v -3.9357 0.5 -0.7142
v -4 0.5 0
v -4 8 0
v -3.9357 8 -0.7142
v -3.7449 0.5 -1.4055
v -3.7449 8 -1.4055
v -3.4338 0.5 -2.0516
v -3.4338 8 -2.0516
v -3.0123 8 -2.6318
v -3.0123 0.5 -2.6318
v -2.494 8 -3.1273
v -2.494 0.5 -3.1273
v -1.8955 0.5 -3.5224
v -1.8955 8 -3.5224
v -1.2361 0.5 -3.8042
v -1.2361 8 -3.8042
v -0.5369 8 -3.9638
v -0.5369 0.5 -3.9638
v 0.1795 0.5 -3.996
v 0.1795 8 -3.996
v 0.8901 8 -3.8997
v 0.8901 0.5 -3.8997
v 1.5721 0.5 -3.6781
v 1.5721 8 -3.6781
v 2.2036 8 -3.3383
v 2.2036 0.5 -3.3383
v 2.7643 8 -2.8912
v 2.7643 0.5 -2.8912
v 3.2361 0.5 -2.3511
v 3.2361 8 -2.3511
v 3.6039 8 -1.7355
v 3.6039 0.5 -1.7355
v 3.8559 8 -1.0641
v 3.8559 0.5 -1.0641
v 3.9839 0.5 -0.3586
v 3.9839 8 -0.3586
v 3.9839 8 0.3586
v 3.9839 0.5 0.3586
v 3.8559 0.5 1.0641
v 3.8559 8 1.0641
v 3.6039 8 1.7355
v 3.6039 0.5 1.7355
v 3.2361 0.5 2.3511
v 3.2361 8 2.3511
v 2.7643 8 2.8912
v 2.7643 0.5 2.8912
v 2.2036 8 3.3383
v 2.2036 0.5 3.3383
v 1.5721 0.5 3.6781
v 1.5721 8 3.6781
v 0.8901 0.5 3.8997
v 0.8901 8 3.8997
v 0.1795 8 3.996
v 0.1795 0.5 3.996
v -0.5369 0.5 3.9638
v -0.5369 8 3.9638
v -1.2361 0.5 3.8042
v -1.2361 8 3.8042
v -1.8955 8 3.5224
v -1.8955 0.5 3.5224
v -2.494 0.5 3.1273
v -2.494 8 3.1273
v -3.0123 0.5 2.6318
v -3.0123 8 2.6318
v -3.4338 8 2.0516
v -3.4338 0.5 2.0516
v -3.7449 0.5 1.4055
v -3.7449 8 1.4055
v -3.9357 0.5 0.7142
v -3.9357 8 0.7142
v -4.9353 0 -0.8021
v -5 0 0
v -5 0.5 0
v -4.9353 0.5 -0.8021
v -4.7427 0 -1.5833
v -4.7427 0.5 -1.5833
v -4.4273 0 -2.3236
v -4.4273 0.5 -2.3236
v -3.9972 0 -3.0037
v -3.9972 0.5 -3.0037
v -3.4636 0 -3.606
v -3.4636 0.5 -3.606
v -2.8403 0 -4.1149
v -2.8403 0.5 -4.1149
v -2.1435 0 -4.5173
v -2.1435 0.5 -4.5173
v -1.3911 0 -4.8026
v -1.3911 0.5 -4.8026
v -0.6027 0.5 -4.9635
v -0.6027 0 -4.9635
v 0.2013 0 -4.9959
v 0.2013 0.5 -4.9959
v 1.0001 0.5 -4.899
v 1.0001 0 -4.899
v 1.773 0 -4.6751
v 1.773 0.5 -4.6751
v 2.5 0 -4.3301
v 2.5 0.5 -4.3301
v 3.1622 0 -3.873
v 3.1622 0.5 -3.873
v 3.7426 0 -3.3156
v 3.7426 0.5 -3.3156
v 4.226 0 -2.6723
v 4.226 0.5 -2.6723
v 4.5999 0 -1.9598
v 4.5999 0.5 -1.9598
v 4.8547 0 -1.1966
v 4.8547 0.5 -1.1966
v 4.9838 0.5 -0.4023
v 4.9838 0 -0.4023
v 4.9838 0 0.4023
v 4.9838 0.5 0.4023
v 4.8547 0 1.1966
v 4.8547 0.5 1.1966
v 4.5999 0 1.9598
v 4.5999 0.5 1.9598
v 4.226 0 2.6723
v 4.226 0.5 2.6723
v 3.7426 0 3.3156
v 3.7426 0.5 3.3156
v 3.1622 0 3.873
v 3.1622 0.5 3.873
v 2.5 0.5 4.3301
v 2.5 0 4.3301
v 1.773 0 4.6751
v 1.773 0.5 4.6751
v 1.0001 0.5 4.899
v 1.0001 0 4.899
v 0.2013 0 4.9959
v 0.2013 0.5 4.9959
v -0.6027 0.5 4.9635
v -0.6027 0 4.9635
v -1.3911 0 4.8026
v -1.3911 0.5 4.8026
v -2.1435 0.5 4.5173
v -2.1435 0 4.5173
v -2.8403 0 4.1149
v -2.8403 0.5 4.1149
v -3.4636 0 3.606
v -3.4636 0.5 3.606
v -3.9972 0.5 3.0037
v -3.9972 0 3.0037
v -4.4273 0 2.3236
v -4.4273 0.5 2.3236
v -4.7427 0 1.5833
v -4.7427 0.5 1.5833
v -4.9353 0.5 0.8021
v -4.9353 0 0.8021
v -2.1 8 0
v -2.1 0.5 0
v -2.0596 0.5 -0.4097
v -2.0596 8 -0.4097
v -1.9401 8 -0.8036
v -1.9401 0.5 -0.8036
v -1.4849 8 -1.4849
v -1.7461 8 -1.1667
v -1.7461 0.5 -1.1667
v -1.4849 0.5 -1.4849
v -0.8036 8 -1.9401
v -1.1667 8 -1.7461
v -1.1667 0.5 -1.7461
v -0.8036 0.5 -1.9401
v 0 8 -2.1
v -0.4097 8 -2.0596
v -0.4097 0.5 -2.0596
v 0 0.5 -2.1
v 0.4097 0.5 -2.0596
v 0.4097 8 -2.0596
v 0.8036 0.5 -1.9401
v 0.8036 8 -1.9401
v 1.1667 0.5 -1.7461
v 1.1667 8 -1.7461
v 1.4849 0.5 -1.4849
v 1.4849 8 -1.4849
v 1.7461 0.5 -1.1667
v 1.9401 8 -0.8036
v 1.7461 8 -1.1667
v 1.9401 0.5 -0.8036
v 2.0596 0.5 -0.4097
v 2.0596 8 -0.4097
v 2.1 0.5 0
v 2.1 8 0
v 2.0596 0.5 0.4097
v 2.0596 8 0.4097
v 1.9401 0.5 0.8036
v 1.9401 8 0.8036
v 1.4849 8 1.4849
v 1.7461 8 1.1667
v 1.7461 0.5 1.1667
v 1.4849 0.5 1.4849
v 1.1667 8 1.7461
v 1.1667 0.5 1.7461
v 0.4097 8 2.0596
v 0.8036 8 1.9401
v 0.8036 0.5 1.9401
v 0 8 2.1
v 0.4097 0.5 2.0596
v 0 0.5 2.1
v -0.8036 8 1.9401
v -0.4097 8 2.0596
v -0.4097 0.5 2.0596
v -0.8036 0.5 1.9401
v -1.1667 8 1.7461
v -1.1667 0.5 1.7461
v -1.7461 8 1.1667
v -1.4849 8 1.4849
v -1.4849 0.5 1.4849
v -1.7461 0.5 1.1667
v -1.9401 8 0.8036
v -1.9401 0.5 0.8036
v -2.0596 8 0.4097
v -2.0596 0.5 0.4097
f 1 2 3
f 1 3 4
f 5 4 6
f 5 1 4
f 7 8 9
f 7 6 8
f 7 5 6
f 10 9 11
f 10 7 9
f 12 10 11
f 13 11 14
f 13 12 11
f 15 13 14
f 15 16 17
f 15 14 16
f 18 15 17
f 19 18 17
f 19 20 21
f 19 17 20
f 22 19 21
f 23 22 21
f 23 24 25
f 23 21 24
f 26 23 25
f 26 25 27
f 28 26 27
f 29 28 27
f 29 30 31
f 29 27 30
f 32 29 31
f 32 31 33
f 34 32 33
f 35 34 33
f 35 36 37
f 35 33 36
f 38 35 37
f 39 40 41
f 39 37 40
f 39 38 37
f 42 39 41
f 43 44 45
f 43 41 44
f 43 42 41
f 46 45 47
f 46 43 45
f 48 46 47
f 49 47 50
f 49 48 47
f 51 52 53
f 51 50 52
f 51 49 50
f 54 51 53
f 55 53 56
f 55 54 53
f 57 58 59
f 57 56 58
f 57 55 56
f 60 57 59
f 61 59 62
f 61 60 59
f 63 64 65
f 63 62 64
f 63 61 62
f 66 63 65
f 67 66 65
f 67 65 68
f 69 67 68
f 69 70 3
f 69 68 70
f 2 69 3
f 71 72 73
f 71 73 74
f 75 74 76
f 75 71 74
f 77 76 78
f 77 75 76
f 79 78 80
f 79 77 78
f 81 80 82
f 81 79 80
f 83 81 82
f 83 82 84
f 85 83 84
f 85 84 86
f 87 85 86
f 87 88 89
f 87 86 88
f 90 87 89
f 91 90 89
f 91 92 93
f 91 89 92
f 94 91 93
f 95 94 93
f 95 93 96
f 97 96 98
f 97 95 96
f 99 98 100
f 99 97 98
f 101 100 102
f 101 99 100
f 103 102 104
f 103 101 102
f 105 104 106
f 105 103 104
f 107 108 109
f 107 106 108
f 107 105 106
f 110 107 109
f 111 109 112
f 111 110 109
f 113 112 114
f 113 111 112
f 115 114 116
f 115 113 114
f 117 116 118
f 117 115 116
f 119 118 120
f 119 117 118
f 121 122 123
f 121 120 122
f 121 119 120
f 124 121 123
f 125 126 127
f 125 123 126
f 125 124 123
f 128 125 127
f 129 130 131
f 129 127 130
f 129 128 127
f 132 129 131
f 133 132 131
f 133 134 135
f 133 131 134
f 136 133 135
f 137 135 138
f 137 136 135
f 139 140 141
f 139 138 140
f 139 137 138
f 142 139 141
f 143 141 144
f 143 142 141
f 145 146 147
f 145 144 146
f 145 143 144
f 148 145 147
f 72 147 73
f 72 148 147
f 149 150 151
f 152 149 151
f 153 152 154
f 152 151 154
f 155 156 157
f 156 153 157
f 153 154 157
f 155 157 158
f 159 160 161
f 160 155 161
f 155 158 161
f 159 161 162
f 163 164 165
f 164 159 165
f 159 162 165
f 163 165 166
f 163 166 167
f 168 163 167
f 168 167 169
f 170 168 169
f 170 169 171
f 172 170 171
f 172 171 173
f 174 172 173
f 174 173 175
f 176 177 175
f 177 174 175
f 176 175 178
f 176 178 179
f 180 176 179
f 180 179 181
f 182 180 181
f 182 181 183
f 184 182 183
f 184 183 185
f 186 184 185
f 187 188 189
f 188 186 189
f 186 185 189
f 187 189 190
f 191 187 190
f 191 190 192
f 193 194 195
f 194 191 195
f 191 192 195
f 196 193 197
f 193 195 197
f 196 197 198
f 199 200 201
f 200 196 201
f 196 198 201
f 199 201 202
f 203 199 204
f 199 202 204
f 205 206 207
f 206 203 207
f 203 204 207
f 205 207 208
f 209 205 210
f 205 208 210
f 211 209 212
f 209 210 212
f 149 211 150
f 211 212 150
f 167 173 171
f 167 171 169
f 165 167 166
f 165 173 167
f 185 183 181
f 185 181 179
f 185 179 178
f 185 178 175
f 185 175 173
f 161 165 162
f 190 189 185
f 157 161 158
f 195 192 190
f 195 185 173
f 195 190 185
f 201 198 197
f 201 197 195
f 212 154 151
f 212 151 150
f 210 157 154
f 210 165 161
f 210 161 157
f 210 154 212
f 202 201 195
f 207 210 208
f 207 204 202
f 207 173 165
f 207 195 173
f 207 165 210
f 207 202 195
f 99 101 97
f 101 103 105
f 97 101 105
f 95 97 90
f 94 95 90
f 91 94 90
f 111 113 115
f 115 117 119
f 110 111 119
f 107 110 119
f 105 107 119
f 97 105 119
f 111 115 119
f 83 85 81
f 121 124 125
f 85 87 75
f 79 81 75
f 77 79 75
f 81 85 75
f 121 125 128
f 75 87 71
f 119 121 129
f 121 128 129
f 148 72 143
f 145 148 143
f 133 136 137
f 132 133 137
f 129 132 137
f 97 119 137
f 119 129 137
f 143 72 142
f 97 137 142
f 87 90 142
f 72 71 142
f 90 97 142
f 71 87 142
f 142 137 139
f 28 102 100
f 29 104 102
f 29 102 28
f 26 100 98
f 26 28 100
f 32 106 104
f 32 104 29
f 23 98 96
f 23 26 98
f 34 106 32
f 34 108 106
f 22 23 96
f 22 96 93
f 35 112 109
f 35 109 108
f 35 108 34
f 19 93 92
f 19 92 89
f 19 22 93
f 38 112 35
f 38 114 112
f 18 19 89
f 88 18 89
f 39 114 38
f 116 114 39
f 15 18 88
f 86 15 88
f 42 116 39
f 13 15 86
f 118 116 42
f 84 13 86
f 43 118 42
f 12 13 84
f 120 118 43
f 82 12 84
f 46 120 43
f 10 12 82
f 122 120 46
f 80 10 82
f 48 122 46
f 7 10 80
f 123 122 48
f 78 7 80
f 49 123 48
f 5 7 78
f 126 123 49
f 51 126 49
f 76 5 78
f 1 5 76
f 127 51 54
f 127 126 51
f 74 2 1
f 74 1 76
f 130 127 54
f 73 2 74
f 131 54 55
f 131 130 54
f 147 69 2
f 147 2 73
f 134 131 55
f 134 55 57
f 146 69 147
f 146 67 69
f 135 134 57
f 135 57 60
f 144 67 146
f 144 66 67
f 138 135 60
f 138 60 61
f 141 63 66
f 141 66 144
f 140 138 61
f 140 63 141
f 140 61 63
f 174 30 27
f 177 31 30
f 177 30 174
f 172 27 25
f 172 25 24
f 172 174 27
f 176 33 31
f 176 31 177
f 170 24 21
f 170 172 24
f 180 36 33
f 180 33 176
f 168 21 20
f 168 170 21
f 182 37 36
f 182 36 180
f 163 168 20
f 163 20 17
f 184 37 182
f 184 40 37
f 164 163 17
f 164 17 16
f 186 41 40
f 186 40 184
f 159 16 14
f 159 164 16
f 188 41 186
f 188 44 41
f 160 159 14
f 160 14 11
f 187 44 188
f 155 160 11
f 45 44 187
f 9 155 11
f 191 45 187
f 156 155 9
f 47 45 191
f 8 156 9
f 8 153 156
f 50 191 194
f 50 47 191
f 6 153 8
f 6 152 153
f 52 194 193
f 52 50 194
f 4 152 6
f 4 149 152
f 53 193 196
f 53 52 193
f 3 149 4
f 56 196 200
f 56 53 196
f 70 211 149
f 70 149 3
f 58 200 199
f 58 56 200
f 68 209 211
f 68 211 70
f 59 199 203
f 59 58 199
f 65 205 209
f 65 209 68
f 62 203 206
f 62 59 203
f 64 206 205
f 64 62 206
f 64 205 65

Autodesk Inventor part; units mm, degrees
ref_plane "YZ Plane" through (0, 0, 0) normal (1, 0, 0) x (0, 1, 0)
ref_plane "XZ Plane" through (0, 0, 0) normal (0, 1, 0) x (-1, 0, 0)
ref_plane "XY Plane" through (0, 0, 0) normal (0, 0, 1) x (1, 0, 0)
sketch "Sketch1" plane through (0, 0, 0) normal (0, 1, 0) x (-1, 0, 0)
  circle A0 centre (0, 0) radius 2.1
  circle A1 centre (0, 0) radius 4
  circle A2 centre (0, 0) radius 5
  dimension "d0" = 4.2
  dimension "d1" = 8
  dimension "d2" = 10
extrude "Extrusion1" add sketch "Sketch1" along normal blind 8 contours A1
extrude "Extrusion2" add sketch "Sketch1" along normal blind 0.5
thread "Thread1" size "M5x0.8" class "6H" standard "ANSI Metric M Profile" full length
properties part number "Návarek M5" material "Aluminum 6061"
